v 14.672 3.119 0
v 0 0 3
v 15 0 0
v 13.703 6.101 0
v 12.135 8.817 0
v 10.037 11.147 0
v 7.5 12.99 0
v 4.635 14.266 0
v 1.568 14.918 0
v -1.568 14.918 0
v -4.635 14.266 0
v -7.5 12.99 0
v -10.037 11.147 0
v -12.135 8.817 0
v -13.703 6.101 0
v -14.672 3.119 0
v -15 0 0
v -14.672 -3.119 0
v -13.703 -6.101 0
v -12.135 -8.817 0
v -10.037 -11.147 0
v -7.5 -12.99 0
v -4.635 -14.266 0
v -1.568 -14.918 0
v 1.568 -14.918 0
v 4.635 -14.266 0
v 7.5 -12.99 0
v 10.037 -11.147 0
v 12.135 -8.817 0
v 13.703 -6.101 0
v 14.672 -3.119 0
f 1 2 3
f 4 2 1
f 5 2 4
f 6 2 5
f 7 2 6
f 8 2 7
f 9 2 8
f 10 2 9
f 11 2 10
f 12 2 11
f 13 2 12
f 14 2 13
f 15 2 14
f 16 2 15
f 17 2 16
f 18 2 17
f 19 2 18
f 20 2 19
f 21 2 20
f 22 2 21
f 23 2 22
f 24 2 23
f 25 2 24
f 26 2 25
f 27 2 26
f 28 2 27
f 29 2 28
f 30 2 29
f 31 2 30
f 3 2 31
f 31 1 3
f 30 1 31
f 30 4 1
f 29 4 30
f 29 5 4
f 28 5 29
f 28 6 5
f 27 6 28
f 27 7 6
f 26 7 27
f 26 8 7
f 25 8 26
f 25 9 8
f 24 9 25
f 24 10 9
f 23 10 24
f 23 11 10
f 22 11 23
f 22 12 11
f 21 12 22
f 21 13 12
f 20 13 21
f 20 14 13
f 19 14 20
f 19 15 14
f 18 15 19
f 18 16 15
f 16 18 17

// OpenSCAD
// Generated by SolidPython 1.0.1 on 2020-07-29 00:46:43


cylinder(h = 3, r1 = 15, r2 = 0);
/***********************************************
*********      SolidPython code:      **********
************************************************
 
# import packages: SolidPython
from solid import *
from solid.utils import *
from itertools import chain, combinations, permutations


class Resize:

    def __init__(self, scad_file):
        self.scad_file = scad_file
        #self.scad_file = import_scad(scad_file)
        # cone/cylinder param:
        self.r1 = 0
        self.r2 = 0
        self.h = 0
        # rectangular prism param:
        self.w = 0
        self.l = 0
        # ellipse param:
        self.r = 0

    # import OpenScad code (file name corresponds to shape)


    # classify shape + parameters
    def assign(self, param1, param2, param3):
        if self.scad_file == 'cone.scad':
            self.r1 = param1
            self.r2 = param2
            self.h = param3
        elif self.scad_file == 'cylinder.scad':
            self.r1 = param1
            self.r2 = param2
            self.h = param3
        elif self.scad_file == 'rectangularPrism.scad':
            self.h = param1
            self.l = param2
            self.w = param3
        else:
            self.r = param1
            self.h = param2

    # resize parameters
    def iterate(self):
        x = range(3, 20, 2)
        i = 1
        if self.scad_file == 'cone.scad':
            tempList = list(permutations(x, 2))
            for temp in tempList:
                param1 = temp[0]
                param2 = temp[1]
                filepath = 'produced_scad_files/' + 'cone' + str(param1) + '_' + str(param2) + '_' + '.scad'
                scad_render_to_file(cylinder(h=param1, r1=param2, r2=0), filepath)

        elif self.scad_file == 'cylinder.scad':
            tempList = list(permutations(x, 3))
            for temp in tempList:
                param1 = temp[0]
                param2 = temp[1]
                filepath = 'produced_scad_files/' + 'cylinder' + str(param1) + '_' + str(param2) + '_' + '.scad'
                scad_render_to_file(cylinder(h=param1, r1=param2, r2=param2), filepath)

        elif self.scad_file == 'rectangularPrism.scad':
            tempList = list(permutations(x, 3))
            for temp in tempList:
                param1 = temp[0]
                param2 = temp[1]
                param3 = temp[2]
                filepath = 'produced_scad_files/' + 'rectangularPrism' + str(param1) + '_' + str(param2) + '_' + str(
                    param3) + '.scad'
                scad_render_to_file(cube(size=(param1, param2, param3)), filepath)

        elif self.scad_file == 'ellipse.scad':
            tempList = list(permutations(x, 4))
            for temp in tempList:
                param1 = temp[0]
                param2 = temp[1]
                param3 = temp[2]
                param4 = temp[3]
                filepath = 'produced_scad_files/' + 'ellipse' + str(param1) + '_' + str(param2) + '_' + str(param3) + '_' + str(param4) + '.scad'
                scad_render_to_file(scale([param1, param2, param3])(sphere(r=param4)), filepath)

    def render_to_scadfile(self):
        scad_render_to_file(scad, 'example.scad') 
 
************************************************/
